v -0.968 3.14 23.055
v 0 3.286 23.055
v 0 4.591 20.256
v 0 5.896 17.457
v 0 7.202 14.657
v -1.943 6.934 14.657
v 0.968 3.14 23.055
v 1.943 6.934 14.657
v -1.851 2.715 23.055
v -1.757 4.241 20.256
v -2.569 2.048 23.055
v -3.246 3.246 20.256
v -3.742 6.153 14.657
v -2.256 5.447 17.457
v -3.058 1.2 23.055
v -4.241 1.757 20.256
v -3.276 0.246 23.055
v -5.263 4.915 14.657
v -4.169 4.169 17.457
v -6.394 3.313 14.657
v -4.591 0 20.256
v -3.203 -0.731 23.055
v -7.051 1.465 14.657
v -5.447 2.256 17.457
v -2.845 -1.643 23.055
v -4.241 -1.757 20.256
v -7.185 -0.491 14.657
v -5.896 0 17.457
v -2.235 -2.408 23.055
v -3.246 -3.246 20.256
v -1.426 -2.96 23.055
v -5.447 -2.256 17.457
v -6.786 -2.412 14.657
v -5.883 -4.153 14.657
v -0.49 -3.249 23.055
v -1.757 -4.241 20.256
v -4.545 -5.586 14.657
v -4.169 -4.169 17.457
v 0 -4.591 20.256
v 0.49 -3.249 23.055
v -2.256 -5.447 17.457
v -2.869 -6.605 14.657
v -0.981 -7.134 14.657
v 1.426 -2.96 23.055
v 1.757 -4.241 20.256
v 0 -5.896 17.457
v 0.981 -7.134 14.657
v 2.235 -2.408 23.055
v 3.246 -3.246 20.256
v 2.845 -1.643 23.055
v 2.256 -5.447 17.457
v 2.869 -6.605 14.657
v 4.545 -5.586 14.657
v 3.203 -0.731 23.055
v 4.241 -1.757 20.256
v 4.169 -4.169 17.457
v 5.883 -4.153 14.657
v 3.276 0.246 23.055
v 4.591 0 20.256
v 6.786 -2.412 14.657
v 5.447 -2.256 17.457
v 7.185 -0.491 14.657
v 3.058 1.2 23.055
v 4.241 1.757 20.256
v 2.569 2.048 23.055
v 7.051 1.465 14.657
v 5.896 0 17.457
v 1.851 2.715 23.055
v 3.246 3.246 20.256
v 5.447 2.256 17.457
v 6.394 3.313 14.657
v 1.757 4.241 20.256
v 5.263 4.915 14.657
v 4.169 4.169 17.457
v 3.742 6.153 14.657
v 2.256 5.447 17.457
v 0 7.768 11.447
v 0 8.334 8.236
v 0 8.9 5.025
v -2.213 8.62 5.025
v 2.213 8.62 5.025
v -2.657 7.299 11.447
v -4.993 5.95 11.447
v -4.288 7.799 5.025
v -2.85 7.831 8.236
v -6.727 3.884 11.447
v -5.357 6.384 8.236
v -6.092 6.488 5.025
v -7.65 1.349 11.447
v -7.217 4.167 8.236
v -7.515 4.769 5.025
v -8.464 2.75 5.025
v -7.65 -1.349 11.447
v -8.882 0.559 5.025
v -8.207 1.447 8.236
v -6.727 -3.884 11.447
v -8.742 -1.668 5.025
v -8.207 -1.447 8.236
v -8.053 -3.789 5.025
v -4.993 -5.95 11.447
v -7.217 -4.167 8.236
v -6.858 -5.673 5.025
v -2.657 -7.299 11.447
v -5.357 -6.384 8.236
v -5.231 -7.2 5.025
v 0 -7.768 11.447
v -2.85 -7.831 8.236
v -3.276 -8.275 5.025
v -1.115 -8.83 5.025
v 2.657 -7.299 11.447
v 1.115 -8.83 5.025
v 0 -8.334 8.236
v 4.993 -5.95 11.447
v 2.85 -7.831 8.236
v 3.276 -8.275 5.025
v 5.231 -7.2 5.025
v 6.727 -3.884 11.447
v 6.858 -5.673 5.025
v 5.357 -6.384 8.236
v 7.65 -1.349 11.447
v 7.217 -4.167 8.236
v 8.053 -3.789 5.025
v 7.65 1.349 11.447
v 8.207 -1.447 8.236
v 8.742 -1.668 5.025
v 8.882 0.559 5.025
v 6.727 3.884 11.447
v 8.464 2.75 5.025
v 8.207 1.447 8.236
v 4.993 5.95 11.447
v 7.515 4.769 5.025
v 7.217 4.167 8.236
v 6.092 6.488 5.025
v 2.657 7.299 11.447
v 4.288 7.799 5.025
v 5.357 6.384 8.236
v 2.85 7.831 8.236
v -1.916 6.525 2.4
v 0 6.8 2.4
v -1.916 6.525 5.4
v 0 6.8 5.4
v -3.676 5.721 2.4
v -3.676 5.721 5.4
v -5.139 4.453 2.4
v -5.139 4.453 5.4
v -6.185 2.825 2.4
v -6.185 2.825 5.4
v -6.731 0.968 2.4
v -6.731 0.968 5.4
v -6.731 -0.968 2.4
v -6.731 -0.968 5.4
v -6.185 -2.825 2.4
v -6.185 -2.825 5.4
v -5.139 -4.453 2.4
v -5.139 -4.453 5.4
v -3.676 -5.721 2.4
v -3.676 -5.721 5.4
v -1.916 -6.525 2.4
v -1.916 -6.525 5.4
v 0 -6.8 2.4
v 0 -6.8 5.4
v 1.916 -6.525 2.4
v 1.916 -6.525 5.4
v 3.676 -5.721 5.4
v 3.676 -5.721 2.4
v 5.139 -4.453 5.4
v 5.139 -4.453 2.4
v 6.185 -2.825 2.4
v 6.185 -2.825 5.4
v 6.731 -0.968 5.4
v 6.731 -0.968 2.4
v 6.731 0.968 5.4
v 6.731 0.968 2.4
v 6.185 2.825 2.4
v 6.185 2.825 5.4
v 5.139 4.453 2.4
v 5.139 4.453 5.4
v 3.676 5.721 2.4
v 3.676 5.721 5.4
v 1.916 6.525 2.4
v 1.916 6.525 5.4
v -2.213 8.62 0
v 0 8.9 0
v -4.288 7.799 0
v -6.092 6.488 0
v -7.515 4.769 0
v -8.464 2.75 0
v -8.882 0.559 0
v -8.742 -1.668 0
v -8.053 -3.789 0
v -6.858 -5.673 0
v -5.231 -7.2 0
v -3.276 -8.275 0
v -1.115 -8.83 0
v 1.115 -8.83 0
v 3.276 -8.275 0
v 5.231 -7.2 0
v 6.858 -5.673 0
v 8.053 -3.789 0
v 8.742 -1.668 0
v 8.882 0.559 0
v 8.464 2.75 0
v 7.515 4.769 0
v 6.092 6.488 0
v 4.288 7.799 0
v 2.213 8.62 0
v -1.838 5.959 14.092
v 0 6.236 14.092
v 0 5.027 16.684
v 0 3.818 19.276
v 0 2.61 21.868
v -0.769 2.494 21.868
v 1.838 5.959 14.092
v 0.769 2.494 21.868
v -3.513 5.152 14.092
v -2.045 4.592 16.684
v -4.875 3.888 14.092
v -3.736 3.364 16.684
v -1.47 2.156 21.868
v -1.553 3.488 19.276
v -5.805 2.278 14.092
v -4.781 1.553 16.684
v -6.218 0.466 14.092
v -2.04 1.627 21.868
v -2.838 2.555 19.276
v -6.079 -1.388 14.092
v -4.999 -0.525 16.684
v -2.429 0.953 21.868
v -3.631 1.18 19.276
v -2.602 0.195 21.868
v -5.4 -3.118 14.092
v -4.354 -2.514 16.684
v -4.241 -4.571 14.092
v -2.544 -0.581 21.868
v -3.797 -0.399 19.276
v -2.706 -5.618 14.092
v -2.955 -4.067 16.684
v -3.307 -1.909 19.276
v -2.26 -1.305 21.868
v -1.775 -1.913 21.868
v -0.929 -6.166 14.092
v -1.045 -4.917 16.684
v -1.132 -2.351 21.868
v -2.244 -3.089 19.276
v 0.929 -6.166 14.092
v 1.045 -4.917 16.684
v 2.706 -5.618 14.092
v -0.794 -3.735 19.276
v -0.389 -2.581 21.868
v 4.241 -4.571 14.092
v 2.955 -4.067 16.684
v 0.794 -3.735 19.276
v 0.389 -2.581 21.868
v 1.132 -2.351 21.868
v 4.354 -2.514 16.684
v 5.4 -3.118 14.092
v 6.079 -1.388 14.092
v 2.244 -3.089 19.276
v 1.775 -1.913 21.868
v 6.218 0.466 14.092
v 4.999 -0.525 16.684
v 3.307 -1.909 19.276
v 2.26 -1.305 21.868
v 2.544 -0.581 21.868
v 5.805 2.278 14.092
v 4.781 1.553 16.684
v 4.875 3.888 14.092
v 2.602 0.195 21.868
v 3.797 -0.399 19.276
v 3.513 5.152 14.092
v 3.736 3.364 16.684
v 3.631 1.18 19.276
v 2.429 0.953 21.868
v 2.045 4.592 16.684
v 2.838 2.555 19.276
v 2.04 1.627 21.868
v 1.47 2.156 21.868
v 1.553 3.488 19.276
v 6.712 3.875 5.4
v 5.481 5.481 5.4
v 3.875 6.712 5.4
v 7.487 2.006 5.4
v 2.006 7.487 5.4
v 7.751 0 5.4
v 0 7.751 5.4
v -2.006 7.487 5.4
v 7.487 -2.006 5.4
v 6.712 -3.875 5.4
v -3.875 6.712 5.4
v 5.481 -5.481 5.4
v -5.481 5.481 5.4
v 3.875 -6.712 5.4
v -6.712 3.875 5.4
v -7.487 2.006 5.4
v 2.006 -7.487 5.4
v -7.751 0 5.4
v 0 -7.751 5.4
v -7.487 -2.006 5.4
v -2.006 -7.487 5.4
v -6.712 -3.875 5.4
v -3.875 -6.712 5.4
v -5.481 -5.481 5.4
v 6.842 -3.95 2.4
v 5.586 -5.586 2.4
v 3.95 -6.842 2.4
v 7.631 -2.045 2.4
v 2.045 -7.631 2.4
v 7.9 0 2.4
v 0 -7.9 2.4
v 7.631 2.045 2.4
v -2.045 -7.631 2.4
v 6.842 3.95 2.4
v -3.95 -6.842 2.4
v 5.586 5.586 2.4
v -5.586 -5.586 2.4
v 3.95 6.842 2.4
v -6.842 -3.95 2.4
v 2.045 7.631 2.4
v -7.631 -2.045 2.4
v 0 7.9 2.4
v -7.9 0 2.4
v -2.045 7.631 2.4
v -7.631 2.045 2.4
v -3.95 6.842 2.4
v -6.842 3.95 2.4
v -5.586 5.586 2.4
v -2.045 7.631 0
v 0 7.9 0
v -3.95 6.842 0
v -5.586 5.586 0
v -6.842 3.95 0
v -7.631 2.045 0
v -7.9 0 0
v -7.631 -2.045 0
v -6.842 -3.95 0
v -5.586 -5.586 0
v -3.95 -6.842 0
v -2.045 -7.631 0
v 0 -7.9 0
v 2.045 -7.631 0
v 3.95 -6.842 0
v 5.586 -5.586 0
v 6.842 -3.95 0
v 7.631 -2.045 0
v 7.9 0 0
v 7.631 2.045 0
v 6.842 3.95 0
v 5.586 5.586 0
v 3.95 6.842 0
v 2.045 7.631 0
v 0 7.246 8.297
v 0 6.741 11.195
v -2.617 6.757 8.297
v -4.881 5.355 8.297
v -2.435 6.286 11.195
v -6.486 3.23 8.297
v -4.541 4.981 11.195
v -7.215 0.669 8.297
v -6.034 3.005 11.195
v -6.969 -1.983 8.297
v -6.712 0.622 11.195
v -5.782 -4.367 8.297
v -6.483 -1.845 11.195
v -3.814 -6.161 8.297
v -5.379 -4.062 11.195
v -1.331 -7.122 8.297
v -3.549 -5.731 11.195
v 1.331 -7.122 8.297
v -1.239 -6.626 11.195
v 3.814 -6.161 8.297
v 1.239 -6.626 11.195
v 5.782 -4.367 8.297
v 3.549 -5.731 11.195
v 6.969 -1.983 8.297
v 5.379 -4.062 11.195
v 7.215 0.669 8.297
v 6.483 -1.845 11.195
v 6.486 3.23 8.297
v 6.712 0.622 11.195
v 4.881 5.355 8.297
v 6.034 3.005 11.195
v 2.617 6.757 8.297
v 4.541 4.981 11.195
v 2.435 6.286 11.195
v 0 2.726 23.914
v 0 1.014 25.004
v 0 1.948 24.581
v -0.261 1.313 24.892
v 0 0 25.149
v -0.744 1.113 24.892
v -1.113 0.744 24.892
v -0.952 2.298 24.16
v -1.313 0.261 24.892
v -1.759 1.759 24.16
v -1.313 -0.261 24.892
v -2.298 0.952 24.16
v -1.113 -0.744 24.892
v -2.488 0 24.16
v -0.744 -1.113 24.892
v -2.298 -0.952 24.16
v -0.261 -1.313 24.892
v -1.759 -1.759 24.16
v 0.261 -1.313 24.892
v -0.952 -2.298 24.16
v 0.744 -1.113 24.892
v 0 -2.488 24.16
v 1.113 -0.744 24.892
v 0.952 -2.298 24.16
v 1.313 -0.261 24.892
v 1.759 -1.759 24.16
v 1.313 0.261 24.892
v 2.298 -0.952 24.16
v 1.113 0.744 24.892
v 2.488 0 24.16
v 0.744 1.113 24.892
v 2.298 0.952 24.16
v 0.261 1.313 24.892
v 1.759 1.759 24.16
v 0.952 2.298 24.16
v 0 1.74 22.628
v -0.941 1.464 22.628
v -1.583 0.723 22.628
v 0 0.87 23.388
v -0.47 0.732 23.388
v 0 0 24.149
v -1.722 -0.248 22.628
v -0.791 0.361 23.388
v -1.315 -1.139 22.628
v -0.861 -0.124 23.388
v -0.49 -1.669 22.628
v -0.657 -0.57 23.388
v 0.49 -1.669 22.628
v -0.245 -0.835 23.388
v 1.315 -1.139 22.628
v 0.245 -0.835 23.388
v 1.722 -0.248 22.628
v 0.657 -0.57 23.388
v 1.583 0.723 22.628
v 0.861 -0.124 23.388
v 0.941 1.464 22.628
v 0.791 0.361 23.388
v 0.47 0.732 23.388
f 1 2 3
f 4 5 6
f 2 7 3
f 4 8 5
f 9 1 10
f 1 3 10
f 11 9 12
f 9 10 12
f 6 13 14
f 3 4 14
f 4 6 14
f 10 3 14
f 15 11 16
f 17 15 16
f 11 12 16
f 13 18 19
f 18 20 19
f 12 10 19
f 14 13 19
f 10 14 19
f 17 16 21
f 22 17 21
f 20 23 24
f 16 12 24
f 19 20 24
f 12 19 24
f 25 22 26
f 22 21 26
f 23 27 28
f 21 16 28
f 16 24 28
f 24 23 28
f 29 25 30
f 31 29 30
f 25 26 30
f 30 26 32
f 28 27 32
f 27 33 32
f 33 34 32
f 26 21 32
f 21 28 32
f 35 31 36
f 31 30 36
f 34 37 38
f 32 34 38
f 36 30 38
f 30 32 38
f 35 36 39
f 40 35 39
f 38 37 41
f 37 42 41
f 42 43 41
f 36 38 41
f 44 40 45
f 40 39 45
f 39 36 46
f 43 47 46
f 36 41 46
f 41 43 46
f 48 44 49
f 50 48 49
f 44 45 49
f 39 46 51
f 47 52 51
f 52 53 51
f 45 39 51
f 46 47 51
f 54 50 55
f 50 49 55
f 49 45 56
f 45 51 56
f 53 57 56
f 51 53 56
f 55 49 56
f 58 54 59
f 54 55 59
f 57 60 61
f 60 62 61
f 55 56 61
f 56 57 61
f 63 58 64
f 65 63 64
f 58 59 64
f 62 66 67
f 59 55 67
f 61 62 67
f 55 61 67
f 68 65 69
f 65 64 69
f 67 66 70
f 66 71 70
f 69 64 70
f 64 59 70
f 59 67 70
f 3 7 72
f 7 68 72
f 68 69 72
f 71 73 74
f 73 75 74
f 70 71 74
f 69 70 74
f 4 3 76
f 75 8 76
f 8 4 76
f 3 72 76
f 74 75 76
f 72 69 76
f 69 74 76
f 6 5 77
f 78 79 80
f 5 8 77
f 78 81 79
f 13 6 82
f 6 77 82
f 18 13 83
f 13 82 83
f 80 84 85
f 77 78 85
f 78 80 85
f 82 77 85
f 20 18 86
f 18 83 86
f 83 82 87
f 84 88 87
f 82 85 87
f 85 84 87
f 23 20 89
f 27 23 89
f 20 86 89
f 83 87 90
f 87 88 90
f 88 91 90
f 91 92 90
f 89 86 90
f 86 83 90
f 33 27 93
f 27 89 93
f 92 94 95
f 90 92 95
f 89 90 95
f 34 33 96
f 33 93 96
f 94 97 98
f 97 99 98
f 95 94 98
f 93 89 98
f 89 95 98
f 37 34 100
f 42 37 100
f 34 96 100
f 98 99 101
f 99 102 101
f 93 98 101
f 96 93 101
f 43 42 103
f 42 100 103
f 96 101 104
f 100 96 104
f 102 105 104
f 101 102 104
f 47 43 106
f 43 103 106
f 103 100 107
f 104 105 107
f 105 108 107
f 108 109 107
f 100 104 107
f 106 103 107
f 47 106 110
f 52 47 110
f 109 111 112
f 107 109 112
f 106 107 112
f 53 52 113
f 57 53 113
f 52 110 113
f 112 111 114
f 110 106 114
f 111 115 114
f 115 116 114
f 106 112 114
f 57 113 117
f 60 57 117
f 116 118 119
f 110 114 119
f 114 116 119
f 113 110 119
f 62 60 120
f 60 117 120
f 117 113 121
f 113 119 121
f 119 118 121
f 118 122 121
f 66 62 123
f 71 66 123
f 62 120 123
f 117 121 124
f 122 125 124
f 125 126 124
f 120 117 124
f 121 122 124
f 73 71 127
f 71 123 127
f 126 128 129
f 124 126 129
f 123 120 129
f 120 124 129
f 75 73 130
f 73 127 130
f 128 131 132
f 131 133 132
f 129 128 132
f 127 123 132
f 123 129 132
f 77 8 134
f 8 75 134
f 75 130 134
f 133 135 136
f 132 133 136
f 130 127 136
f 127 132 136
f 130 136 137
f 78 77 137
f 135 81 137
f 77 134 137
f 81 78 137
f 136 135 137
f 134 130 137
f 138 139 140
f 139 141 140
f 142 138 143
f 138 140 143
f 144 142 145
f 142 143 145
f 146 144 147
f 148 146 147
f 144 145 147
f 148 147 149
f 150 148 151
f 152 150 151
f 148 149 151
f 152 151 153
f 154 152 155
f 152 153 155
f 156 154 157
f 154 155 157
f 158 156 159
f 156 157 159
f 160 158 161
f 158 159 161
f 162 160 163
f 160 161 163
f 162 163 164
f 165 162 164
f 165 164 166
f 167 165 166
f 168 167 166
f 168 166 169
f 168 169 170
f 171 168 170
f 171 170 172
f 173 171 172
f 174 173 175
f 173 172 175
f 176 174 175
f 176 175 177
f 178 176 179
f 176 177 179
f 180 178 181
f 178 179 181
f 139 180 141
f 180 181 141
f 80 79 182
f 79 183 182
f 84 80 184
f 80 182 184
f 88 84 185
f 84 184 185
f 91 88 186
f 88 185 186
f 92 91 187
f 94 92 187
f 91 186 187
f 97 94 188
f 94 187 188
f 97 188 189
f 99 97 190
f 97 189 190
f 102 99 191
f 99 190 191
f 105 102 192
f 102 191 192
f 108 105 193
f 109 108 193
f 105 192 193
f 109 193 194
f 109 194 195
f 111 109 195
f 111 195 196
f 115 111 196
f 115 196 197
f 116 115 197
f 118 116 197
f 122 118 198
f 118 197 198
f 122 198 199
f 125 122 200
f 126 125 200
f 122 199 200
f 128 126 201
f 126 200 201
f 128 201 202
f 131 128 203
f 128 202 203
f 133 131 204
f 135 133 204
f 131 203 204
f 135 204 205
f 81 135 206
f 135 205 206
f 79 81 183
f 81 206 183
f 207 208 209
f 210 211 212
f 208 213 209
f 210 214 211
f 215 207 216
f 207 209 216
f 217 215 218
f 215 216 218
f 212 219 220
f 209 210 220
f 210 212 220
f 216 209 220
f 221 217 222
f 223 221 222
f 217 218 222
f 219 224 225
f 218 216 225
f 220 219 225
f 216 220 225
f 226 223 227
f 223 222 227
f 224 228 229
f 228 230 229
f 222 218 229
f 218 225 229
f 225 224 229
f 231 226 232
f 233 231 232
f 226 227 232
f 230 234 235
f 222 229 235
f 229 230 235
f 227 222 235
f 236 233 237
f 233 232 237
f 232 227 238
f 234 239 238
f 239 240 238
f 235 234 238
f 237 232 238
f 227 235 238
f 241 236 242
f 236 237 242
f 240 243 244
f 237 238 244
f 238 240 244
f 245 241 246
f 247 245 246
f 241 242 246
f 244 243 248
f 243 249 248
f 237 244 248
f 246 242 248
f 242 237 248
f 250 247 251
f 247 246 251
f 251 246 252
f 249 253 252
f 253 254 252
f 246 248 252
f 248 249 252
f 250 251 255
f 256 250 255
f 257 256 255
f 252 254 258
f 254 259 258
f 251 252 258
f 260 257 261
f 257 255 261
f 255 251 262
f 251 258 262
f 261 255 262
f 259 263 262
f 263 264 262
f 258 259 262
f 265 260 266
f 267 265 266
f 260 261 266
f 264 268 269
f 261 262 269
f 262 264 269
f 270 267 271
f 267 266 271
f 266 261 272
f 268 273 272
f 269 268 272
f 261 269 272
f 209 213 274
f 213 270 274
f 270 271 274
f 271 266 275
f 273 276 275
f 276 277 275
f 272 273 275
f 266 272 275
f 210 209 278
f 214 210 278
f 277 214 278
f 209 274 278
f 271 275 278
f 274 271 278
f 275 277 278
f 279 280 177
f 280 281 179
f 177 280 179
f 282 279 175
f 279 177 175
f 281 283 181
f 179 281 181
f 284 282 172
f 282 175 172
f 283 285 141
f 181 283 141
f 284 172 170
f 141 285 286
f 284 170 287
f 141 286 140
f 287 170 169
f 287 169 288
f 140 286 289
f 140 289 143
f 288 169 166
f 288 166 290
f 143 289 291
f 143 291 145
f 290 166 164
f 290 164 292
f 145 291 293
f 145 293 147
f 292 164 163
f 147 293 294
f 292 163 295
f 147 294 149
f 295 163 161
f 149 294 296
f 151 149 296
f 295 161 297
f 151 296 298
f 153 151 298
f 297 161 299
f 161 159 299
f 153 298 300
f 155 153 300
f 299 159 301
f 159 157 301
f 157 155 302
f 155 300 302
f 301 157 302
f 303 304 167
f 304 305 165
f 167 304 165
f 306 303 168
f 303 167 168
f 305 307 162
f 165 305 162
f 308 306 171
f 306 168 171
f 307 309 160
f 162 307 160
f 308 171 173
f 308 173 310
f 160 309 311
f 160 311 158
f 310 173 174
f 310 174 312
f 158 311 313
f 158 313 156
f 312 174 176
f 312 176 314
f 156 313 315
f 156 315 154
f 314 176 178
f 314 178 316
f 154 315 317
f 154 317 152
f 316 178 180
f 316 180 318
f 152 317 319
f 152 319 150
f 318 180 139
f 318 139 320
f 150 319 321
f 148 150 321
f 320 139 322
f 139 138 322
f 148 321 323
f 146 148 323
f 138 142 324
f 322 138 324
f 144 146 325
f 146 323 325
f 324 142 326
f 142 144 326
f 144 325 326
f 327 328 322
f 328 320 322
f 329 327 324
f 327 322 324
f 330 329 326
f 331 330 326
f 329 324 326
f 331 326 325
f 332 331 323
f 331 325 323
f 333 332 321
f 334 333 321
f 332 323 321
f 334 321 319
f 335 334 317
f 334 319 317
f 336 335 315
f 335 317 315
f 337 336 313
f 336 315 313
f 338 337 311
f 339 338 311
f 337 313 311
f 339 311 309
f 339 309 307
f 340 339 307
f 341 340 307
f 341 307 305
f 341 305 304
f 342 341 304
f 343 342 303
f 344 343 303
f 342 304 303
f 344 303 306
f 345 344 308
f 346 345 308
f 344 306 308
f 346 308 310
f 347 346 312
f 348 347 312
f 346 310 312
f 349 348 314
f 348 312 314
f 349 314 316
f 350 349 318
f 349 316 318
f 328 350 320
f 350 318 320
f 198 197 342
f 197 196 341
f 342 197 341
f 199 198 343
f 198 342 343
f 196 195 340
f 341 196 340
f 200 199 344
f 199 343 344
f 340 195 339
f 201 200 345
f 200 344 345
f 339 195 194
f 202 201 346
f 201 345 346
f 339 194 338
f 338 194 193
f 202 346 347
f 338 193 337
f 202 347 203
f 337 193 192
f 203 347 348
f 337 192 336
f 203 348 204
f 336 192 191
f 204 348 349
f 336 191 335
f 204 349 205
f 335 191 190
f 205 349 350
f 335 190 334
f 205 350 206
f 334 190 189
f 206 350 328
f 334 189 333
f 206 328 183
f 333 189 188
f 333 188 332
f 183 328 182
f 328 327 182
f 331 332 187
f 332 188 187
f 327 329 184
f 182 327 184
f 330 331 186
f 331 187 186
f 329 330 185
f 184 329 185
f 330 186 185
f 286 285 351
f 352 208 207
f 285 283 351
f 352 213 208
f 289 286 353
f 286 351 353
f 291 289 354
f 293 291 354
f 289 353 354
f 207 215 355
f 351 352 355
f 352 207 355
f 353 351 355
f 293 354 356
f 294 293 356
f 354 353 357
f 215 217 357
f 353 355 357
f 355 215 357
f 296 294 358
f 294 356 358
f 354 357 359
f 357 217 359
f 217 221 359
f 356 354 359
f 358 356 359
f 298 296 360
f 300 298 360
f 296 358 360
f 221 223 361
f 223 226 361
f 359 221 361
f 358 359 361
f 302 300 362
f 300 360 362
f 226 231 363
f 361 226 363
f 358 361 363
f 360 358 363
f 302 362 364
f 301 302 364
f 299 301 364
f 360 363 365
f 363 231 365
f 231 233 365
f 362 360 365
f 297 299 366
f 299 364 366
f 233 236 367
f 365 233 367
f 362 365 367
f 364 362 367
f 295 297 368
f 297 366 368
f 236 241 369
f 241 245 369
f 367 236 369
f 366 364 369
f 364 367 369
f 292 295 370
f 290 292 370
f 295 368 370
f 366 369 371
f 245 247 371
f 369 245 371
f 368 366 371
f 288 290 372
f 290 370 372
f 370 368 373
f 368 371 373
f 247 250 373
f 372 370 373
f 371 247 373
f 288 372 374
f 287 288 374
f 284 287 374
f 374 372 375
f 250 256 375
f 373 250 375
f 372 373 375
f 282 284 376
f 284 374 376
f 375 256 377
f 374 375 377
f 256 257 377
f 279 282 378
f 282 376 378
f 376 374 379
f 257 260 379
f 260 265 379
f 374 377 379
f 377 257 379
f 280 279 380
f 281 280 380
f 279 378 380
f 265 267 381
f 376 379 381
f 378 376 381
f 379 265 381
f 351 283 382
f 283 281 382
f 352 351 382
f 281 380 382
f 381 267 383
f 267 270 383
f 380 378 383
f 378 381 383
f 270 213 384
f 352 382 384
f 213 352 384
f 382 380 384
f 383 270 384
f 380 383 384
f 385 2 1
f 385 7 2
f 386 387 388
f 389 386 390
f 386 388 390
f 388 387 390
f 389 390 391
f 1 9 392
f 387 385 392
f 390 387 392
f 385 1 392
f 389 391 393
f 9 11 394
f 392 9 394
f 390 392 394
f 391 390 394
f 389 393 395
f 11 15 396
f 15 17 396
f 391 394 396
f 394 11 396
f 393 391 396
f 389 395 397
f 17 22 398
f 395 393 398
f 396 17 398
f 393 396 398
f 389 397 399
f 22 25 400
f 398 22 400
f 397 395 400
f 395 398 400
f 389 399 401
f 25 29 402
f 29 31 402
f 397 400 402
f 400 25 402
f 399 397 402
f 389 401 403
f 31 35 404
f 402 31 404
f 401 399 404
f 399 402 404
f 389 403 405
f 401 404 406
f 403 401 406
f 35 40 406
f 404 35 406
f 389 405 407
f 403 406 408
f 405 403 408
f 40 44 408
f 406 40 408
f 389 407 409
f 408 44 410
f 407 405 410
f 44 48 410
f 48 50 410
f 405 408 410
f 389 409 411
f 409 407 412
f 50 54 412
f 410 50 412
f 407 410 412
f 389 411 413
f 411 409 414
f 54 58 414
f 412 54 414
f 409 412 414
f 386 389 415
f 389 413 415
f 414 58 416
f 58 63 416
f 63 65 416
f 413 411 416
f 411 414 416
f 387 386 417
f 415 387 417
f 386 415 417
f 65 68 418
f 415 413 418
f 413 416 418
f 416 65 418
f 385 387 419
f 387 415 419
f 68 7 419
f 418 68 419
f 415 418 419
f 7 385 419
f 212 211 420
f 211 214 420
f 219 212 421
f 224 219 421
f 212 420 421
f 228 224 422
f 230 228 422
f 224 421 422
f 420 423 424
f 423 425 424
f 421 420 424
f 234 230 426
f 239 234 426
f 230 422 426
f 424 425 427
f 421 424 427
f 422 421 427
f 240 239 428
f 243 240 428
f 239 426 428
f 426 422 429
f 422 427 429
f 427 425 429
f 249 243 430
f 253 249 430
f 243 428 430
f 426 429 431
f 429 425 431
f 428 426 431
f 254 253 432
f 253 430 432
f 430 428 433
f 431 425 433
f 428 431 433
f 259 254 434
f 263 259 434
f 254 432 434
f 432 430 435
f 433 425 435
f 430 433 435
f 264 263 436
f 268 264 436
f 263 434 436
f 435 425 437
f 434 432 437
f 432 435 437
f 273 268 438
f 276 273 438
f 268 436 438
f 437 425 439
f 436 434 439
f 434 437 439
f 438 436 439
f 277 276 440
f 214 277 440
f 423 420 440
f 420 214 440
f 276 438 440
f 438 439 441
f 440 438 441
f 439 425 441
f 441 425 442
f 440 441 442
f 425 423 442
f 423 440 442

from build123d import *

# Parameters (mm, degrees)
F3_ANGLE = 90


with BuildPart() as f1:
    # F0 (on Top) → F1 (revolve)
    with BuildSketch(Plane.XY):
        with BuildLine():
            Line((0, 8.9), (0, 7.9))
            Line((0, 7.9), (2.4, 7.9))
            Line((2.4, 7.9), (2.4, 6.8))
            Line((2.4, 6.8), (5.4, 6.8))
            Line((5.4, 6.8), (5.4, 7.7508590184))
            Line((5.4, 7.7508590184), (14.092461206, 6.2356893905))
            Line((14.092461206, 6.2356893905), (21.86847149, 2.6096762451))
            Line((21.86847149, 2.6096762451), (24.1485125287, 0))
            Line((24.1485125287, 0), (25.1485125287, 0))
            ThreePointArc((25.1485125287, 0), (24.5807771156, 1.9478119615), (23.0553953206, 3.2855358927))
            Line((23.0553953206, 3.2855358927), (14.6574713698, 7.2015521436))
            Line((14.6574713698, 7.2015521436), (5.0250949202, 8.9))
            Line((5.0250949202, 8.9), (0, 8.9))
        make_face()
    revolve(axis=Axis((12.5827532146, 0, 0), (1, 0, 0)))


with BuildPart() as f1_1:
    # F3: moved
    add(f1.part.rotate(Axis((0, 0, 0), (0, -1, 0)), F3_ANGLE))


solid = f1_1.part
